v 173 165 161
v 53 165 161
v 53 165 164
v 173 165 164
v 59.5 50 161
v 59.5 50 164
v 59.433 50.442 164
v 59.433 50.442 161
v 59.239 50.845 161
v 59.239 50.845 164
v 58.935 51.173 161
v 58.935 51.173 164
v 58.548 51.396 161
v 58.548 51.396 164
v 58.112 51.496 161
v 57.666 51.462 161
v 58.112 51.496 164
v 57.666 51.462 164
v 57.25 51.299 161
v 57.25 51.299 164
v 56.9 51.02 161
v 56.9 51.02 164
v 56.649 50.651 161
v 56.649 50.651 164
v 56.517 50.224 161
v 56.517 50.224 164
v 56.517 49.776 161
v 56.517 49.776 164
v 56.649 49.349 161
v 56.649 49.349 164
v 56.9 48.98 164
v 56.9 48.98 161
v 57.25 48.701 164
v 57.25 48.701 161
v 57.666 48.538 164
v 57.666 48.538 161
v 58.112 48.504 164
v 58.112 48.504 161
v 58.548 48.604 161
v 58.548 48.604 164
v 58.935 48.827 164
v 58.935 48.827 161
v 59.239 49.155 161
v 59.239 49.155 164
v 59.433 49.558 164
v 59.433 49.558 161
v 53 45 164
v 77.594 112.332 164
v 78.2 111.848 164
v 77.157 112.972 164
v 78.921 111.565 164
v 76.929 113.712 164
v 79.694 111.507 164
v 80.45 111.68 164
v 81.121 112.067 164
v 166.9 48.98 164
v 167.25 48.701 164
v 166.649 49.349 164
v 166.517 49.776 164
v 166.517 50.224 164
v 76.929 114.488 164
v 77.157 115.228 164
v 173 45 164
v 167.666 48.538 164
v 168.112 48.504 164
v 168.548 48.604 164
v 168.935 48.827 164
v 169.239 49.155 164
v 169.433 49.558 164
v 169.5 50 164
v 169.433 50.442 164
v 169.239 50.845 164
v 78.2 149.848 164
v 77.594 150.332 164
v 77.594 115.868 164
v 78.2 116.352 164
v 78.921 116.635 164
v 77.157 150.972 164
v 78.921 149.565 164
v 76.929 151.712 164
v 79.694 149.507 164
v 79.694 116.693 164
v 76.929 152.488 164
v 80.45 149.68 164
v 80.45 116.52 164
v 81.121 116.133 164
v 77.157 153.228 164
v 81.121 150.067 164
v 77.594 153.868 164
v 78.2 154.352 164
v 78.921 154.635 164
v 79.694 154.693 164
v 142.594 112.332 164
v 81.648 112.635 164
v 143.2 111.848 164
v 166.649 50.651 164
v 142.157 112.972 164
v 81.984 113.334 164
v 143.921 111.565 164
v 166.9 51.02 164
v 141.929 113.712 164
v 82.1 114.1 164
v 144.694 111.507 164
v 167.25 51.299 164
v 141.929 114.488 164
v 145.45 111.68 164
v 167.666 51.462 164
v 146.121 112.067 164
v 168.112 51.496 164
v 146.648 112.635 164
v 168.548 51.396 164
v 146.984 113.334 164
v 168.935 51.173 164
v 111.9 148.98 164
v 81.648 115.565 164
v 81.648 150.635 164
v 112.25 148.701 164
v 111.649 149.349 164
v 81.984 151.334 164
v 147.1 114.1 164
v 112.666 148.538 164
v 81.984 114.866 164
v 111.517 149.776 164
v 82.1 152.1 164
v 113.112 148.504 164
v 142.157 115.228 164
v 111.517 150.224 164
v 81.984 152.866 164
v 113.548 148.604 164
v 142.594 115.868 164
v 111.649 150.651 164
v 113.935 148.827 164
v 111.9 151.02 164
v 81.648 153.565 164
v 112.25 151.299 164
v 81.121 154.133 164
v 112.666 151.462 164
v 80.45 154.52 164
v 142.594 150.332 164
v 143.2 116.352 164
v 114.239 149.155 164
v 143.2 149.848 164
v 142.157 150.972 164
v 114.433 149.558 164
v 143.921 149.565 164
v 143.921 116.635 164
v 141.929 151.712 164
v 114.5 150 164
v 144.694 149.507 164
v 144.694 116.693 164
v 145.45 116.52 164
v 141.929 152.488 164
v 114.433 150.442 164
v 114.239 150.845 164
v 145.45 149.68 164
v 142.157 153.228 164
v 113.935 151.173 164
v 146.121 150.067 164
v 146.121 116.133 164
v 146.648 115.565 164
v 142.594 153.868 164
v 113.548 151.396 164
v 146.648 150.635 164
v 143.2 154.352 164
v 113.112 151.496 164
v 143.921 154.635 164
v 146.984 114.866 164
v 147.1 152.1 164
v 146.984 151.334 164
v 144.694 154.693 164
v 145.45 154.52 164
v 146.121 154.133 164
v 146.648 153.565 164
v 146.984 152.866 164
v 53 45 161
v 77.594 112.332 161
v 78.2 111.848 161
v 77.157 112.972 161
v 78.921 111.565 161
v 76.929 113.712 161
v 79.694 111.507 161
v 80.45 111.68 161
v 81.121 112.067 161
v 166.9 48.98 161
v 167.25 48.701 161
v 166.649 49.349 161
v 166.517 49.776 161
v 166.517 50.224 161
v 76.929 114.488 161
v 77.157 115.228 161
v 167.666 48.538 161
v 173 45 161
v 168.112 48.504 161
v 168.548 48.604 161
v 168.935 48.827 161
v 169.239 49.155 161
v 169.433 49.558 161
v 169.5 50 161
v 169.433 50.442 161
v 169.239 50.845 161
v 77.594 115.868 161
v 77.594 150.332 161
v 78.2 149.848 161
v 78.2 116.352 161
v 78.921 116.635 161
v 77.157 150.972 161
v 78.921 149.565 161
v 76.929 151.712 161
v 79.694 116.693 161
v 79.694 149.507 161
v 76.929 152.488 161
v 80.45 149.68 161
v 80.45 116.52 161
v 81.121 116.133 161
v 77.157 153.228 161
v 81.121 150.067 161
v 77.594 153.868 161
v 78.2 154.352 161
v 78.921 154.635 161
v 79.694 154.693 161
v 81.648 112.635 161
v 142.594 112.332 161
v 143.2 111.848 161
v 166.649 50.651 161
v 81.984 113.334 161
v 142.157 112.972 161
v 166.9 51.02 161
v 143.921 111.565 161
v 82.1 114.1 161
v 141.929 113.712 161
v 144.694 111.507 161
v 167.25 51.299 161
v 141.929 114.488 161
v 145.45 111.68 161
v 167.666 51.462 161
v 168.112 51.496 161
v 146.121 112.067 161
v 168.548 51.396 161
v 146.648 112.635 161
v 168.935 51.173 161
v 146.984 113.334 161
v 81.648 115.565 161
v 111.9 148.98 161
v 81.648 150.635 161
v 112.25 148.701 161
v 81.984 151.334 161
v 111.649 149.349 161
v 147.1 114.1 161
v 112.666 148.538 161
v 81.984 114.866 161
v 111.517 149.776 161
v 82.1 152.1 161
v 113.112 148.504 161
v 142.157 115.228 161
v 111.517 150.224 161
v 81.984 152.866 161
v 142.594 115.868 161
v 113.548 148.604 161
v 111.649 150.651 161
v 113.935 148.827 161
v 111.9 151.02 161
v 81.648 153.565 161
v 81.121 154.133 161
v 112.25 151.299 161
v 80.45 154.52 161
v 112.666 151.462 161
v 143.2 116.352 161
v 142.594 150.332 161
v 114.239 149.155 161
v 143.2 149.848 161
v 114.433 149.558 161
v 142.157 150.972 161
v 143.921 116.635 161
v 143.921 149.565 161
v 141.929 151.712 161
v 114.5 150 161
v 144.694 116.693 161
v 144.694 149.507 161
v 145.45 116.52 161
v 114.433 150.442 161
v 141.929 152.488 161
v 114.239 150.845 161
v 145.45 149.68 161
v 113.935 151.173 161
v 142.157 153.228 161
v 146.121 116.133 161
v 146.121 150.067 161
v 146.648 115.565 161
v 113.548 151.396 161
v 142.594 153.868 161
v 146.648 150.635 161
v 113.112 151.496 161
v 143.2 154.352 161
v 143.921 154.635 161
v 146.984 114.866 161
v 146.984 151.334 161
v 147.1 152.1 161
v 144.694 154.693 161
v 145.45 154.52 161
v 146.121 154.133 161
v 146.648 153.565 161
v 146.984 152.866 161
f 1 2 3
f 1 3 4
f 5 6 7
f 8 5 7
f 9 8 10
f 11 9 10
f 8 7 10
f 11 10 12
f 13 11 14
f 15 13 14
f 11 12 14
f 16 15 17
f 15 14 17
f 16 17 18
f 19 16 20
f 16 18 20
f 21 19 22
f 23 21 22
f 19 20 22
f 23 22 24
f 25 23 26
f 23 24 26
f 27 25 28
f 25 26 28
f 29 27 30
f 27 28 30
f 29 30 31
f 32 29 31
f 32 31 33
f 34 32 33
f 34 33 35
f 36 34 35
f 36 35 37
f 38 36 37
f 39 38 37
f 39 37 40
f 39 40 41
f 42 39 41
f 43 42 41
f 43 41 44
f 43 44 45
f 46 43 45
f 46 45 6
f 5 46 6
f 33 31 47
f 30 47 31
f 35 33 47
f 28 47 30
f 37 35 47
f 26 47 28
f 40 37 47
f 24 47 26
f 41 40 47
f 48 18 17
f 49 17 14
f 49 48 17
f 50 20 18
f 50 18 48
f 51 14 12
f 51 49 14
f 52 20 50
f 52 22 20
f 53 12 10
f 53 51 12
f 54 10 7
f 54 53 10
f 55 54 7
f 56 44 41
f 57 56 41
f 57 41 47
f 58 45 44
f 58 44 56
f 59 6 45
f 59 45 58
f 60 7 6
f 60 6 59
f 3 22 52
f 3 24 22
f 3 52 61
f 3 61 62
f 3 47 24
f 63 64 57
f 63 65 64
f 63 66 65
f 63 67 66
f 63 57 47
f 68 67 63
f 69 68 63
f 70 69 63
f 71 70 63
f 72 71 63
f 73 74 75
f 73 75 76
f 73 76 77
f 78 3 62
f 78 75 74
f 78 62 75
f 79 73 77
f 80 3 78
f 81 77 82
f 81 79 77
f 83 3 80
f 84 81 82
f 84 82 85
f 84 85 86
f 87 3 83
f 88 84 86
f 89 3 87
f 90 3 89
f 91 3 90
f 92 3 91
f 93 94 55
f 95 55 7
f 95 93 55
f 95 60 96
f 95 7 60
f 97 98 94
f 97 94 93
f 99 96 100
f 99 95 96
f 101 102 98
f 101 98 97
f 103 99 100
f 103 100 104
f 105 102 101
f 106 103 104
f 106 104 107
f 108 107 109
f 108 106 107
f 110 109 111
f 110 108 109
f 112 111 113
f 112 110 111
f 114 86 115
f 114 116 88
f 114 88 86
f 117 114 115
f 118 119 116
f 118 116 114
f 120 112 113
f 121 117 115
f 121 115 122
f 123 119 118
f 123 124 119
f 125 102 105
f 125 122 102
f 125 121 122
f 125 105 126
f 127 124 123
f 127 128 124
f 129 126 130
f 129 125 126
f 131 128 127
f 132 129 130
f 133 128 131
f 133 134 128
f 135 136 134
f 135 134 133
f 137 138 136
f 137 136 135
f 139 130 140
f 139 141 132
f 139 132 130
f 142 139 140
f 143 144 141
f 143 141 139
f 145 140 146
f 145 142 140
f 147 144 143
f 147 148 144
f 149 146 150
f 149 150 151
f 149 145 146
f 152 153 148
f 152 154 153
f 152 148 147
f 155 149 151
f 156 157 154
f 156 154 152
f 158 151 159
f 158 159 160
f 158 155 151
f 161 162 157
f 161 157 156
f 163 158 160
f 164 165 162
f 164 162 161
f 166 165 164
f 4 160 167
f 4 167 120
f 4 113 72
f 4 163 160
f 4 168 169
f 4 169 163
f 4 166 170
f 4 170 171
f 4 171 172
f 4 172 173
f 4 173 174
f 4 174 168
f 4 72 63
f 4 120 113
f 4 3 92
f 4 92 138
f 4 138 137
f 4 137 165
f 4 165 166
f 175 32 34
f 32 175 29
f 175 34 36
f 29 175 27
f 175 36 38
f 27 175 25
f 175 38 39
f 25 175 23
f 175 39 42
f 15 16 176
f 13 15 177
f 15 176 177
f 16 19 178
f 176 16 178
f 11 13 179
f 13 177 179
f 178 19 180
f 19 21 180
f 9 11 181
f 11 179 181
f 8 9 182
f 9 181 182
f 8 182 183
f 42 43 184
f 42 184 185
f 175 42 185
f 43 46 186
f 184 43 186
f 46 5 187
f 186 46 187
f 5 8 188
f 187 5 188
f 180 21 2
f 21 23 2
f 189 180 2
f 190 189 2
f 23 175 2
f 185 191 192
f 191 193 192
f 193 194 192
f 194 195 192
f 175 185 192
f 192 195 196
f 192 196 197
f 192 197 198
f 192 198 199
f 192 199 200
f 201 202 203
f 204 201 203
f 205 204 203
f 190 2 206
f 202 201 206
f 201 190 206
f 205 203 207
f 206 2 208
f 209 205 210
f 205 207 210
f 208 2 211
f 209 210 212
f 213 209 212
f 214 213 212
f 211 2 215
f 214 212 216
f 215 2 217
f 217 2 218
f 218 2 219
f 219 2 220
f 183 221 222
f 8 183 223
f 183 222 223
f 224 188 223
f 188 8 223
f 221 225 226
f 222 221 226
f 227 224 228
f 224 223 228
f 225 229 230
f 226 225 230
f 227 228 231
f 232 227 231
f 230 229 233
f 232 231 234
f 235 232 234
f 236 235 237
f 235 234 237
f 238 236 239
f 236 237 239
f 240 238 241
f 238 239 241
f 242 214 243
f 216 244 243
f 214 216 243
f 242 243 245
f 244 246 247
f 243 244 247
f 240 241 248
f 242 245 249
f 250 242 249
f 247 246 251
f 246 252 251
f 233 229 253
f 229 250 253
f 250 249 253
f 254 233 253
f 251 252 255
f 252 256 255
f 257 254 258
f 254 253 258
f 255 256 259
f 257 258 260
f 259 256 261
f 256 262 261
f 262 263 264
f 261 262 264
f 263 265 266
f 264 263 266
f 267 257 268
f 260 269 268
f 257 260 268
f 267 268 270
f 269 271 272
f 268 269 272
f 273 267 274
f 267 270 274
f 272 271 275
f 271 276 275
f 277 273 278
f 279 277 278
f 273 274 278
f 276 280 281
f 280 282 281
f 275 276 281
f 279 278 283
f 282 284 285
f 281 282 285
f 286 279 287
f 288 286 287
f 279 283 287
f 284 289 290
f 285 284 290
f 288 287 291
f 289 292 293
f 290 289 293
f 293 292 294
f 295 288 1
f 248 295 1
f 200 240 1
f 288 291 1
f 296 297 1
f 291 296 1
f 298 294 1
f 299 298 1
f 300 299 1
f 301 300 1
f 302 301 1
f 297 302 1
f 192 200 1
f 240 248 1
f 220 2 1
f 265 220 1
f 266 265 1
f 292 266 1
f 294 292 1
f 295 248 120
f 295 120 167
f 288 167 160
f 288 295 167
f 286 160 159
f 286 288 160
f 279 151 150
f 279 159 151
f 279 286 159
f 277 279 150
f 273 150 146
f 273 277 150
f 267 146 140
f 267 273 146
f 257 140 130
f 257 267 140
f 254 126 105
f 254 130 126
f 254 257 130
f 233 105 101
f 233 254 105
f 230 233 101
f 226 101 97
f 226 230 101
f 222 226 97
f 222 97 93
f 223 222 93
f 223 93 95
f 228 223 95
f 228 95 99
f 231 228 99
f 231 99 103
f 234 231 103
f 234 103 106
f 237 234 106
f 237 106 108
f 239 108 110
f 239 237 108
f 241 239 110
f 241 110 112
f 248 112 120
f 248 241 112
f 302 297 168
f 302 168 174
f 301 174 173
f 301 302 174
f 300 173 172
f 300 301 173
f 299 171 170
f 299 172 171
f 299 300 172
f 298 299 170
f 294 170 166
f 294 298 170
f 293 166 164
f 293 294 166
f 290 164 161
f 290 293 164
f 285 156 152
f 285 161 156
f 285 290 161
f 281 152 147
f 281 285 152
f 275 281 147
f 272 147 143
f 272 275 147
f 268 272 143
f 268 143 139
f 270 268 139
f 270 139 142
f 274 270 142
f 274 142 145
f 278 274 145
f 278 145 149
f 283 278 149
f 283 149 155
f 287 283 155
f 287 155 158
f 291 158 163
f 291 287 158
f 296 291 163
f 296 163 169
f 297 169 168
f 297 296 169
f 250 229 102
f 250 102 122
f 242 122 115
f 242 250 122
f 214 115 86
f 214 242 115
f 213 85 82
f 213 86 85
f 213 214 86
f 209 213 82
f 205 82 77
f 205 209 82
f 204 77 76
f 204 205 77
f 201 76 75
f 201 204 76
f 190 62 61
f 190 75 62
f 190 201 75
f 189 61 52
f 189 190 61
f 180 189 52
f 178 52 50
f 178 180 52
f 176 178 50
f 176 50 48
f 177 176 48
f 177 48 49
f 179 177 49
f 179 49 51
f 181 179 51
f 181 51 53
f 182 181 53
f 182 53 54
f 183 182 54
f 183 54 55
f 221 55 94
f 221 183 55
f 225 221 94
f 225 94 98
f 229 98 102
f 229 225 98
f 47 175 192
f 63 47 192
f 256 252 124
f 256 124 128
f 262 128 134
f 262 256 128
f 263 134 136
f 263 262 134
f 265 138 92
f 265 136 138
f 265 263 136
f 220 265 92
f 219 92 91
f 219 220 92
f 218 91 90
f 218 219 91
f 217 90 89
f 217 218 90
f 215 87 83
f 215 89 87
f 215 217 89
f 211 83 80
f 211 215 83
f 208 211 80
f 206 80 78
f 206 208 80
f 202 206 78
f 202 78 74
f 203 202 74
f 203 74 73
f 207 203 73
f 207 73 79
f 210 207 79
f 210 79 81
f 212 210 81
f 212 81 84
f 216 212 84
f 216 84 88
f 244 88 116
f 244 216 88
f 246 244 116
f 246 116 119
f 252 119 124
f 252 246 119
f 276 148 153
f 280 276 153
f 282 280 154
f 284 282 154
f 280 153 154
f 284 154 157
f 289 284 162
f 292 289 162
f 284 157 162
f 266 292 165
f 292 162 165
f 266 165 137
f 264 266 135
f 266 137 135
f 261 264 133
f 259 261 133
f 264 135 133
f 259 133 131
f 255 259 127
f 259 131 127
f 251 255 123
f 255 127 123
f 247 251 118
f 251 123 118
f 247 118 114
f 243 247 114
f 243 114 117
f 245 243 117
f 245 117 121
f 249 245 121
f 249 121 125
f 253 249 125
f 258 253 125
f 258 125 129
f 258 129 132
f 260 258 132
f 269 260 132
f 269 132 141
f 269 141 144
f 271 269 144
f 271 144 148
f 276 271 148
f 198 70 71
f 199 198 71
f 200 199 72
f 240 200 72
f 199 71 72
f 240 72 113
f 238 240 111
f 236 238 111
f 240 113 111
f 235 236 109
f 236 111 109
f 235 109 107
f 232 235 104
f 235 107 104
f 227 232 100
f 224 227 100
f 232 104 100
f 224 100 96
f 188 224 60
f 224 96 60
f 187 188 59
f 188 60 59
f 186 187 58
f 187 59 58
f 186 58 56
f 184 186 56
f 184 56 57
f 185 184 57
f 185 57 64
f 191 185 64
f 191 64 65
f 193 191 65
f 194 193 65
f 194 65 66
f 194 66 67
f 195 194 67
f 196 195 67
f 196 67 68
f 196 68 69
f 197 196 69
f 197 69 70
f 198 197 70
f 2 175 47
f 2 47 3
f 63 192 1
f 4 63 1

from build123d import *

# Parameters (mm, degrees)
CYLINDER018_R     = 2.6
CYLINDER018_DEPTH = 10
CYLINDER019_R     = 2.6
CYLINDER019_DEPTH = 10
CYLINDER017_R     = 2.6
CYLINDER017_DEPTH = 10
CYLINDER016_R     = 2.6
CYLINDER016_DEPTH = 10
BOX_W             = 120
BOX_H             = 120
BOX_DEPTH         = 3
SKETCH001_R       = 1.5
POCKET007_DEPTH   = 3.001


with BuildPart() as cilindro010:
    # Cylinder018 → Cylinder018 (new body)
    with BuildSketch(Plane(origin=(144.5, 152.1, 158), x_dir=(1, 0, 0), z_dir=(0, 0, 1))):
        Circle(CYLINDER018_R)
    extrude(amount=CYLINDER018_DEPTH)


with BuildPart() as cilindro011:
    # Cylinder019 → Cylinder019 (new body)
    with BuildSketch(Plane(origin=(79.5, 152.1, 158), x_dir=(1, 0, 0), z_dir=(0, 0, 1))):
        Circle(CYLINDER019_R)
    extrude(amount=CYLINDER019_DEPTH)


with BuildPart() as cilindro009:
    # Cylinder017 → Cylinder017 (new body)
    with BuildSketch(Plane(origin=(144.5, 114.1, 158), x_dir=(1, 0, 0), z_dir=(0, 0, 1))):
        Circle(CYLINDER017_R)
    extrude(amount=CYLINDER017_DEPTH)


with BuildPart() as cilindro008:
    # Cylinder016 → Cylinder016 (new body)
    with BuildSketch(Plane(origin=(79.5, 114.1, 158), x_dir=(1, 0, 0), z_dir=(0, 0, 1))):
        Circle(CYLINDER016_R)
    extrude(amount=CYLINDER016_DEPTH)


with BuildPart() as mesainf:
    # Box → Box (new body)
    with BuildSketch(Plane(origin=(53, 45, 161), x_dir=(1, 0, 0), z_dir=(0, 0, 1))):
        with Locations((60, 60)):
            Rectangle(BOX_W, BOX_H)
    extrude(amount=BOX_DEPTH)

    # Cut008: cut Cilindro008
    add(cilindro008.part, mode=Mode.SUBTRACT)

    # Cut009: cut Cilindro009
    add(cilindro009.part, mode=Mode.SUBTRACT)

    # Cut010: cut Cilindro011
    add(cilindro011.part, mode=Mode.SUBTRACT)

    # Cut011: cut Cilindro010
    add(cilindro010.part, mode=Mode.SUBTRACT)

    # Sketch001 → Pocket007 (cut, through all)
    with BuildSketch(Plane.XY.offset(164)):
        with Locations((58, 50)):
            Circle(SKETCH001_R)
        with Locations((168, 50)):
            Circle(SKETCH001_R)
        with Locations((113, 150)):
            Circle(SKETCH001_R)
    extrude(amount=-POCKET007_DEPTH, mode=Mode.SUBTRACT)


solid = mesainf.part
